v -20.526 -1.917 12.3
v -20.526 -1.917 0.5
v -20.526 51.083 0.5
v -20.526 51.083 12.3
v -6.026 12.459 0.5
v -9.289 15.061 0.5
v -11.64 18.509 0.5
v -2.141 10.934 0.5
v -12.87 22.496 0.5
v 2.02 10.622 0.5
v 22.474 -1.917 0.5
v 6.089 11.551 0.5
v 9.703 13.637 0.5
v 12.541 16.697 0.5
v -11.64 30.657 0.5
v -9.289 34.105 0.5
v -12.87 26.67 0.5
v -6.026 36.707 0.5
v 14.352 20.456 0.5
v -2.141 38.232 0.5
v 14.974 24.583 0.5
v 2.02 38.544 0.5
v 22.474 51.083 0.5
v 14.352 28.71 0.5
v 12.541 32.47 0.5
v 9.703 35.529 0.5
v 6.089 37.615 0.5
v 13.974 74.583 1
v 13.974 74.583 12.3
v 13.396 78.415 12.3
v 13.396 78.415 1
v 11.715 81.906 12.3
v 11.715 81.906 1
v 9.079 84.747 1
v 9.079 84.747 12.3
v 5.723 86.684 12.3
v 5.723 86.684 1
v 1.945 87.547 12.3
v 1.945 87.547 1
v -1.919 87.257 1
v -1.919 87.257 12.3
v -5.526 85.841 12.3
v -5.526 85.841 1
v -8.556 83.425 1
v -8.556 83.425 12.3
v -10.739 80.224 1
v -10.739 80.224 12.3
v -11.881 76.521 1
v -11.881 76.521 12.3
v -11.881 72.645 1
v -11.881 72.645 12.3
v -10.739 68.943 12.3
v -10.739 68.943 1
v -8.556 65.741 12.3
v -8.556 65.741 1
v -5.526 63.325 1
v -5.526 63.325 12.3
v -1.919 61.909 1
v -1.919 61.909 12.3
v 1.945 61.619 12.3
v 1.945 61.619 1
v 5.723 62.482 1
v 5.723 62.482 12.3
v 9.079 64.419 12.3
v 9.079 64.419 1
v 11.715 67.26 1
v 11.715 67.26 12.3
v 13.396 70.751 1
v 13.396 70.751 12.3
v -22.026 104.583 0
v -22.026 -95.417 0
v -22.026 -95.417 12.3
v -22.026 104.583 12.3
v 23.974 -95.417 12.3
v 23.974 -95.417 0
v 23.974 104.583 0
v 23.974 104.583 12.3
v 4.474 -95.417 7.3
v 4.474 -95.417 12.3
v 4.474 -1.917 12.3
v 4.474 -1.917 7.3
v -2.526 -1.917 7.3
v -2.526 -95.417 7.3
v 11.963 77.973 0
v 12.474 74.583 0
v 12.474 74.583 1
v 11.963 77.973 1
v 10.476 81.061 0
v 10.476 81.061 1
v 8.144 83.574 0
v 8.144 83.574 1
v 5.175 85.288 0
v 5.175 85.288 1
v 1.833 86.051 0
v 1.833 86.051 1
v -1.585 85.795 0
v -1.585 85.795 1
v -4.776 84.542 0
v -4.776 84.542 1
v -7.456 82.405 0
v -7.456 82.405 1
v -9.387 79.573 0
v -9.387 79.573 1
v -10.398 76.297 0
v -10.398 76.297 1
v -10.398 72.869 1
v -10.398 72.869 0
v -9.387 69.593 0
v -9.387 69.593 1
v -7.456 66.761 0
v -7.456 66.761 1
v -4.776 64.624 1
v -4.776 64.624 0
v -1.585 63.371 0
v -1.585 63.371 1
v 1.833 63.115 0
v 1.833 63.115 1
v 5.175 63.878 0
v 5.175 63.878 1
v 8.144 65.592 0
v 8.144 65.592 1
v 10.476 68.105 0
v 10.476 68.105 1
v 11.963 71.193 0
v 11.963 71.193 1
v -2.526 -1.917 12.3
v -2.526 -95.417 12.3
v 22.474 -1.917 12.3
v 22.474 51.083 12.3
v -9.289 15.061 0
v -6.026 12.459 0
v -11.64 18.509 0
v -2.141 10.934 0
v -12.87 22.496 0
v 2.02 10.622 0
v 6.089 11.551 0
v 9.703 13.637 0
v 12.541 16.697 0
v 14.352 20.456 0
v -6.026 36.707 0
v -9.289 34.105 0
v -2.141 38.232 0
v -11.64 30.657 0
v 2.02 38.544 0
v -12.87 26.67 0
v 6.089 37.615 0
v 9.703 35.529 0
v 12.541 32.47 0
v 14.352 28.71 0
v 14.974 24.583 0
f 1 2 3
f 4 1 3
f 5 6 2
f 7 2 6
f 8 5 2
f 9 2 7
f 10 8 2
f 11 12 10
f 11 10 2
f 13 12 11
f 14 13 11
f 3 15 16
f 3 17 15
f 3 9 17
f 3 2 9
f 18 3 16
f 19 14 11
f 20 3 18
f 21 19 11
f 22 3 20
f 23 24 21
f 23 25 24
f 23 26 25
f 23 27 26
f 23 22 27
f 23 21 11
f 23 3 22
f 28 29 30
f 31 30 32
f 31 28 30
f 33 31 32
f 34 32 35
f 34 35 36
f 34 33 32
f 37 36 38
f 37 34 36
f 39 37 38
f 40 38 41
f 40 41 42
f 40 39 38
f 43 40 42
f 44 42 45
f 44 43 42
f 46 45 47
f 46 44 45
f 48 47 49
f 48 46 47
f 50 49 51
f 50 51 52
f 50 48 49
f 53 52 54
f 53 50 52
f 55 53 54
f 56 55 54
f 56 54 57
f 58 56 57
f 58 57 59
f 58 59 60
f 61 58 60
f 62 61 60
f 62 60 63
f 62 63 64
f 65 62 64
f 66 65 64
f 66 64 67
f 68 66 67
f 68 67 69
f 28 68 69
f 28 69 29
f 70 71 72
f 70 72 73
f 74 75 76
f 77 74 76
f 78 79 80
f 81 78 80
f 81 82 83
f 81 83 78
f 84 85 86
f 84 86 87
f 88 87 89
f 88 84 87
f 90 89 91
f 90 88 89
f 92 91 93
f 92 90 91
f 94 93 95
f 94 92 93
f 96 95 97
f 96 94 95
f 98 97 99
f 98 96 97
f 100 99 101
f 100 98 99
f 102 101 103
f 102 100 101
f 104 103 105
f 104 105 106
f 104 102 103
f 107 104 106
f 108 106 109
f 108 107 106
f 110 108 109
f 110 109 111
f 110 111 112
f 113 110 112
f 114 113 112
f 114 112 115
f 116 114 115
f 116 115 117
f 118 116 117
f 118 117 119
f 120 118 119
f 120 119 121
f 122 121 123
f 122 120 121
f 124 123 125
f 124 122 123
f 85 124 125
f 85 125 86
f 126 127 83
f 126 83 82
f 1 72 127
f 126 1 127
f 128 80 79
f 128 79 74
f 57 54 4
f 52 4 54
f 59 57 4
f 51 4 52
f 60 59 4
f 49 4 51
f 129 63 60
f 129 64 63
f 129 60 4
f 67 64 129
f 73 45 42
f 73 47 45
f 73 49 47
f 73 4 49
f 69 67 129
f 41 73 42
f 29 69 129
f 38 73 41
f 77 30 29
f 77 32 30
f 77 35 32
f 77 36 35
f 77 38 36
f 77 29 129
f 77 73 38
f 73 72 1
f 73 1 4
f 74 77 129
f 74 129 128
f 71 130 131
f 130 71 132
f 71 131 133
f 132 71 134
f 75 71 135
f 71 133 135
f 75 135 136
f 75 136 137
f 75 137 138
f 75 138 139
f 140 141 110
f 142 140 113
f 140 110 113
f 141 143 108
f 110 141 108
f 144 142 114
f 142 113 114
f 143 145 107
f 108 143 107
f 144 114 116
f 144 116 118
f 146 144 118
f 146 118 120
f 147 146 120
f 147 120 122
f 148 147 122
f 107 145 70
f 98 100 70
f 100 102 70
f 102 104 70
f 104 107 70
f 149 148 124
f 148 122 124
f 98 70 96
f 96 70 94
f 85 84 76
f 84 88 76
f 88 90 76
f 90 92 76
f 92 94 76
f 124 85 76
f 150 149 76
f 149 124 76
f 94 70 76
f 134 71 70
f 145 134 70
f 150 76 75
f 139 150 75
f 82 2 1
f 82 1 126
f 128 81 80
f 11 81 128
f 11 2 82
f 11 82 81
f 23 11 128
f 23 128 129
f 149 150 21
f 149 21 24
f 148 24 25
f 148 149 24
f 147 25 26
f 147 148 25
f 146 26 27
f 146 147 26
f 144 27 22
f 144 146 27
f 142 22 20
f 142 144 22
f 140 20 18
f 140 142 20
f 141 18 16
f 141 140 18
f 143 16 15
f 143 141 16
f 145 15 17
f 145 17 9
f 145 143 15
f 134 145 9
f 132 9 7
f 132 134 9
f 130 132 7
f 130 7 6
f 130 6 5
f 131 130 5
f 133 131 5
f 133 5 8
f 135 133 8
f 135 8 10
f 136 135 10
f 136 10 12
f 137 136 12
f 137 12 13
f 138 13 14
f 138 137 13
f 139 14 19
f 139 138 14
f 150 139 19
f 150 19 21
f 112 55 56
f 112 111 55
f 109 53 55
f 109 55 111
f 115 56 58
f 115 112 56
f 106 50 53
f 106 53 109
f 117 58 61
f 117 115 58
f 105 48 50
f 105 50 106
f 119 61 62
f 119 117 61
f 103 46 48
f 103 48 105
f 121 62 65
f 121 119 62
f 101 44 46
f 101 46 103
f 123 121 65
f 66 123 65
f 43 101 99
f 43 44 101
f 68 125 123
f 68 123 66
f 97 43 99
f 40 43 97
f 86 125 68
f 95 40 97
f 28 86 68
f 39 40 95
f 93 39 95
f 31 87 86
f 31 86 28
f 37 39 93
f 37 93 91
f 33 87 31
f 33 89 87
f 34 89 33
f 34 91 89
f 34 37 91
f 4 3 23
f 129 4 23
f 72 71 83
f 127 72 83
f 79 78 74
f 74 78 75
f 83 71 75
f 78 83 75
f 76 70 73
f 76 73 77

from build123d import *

# Parameters (mm, degrees)
F0_W        = 46
F0_H        = 200
F0_W_2      = 43
F0_H_2      = 53
F0_R        = 13
F1_DEPTH    = 11.8
F0_R_2      = 14
F1_FACE_W   = 46
F1_FACE_H   = 200
F1_FACE_W_2 = 43
F1_FACE_H_2 = 53
F1_FACE_R   = 13
F2_DEPTH    = 0.5
F3_W        = 7
F3_H        = 93.5
F4_DEPTH    = 5
F0_R_3      = 11.5
F5_DEPTH    = 1


with BuildPart() as f1:
    # F0 (on Top) → F1 (new body)
    with BuildSketch(Plane.XY):
        with Locations((0.973917, 4.583021)):
            Rectangle(F0_W, F0_H)
        with Locations((0.973917, 24.583021)):
            Rectangle(F0_W_2, F0_H_2, mode=Mode.SUBTRACT)
        with Locations((0.973917, 74.583021)):
            Circle(F0_R, mode=Mode.SUBTRACT)
    extrude(amount=F1_DEPTH)

    # F0 (on Top) + F1_face (on face) → F2 (join)
    with BuildSketch(Plane.XY):
        with Locations((0.973917, 24.583021)):
            Rectangle(F0_W_2, F0_H_2)
        with Locations((0.973917, 24.583021)):
            Circle(F0_R_2, mode=Mode.SUBTRACT)
    with BuildSketch(Plane(origin=(0.973917, -8.365981, 11.8), x_dir=(1, 0, 0), z_dir=(0, 0, 1))):
        with Locations((0, 12.949002)):
            Rectangle(F1_FACE_W, F1_FACE_H)
        with Locations((0, 32.949002)):
            Rectangle(F1_FACE_W_2, F1_FACE_H_2, mode=Mode.SUBTRACT)
        with Locations((0, 82.949002)):
            Circle(F1_FACE_R, mode=Mode.SUBTRACT)
    extrude(amount=F2_DEPTH)

    # F3 (on face) → F4 (cut)
    with BuildSketch(Plane.XY.offset(12.3)):
        with Locations((0.973917, -48.666979)):
            Rectangle(F3_W, F3_H)
    extrude(amount=-F4_DEPTH, mode=Mode.SUBTRACT)

    # F0 (on Top) → F5 (join)
    with BuildSketch(Plane.XY):
        with Locations((0.973917, 74.583021)):
            Circle(F0_R)
        with Locations((0.973917, 74.583021)):
            Circle(F0_R_3, mode=Mode.SUBTRACT)
    extrude(amount=F5_DEPTH)


solid = f1.part
